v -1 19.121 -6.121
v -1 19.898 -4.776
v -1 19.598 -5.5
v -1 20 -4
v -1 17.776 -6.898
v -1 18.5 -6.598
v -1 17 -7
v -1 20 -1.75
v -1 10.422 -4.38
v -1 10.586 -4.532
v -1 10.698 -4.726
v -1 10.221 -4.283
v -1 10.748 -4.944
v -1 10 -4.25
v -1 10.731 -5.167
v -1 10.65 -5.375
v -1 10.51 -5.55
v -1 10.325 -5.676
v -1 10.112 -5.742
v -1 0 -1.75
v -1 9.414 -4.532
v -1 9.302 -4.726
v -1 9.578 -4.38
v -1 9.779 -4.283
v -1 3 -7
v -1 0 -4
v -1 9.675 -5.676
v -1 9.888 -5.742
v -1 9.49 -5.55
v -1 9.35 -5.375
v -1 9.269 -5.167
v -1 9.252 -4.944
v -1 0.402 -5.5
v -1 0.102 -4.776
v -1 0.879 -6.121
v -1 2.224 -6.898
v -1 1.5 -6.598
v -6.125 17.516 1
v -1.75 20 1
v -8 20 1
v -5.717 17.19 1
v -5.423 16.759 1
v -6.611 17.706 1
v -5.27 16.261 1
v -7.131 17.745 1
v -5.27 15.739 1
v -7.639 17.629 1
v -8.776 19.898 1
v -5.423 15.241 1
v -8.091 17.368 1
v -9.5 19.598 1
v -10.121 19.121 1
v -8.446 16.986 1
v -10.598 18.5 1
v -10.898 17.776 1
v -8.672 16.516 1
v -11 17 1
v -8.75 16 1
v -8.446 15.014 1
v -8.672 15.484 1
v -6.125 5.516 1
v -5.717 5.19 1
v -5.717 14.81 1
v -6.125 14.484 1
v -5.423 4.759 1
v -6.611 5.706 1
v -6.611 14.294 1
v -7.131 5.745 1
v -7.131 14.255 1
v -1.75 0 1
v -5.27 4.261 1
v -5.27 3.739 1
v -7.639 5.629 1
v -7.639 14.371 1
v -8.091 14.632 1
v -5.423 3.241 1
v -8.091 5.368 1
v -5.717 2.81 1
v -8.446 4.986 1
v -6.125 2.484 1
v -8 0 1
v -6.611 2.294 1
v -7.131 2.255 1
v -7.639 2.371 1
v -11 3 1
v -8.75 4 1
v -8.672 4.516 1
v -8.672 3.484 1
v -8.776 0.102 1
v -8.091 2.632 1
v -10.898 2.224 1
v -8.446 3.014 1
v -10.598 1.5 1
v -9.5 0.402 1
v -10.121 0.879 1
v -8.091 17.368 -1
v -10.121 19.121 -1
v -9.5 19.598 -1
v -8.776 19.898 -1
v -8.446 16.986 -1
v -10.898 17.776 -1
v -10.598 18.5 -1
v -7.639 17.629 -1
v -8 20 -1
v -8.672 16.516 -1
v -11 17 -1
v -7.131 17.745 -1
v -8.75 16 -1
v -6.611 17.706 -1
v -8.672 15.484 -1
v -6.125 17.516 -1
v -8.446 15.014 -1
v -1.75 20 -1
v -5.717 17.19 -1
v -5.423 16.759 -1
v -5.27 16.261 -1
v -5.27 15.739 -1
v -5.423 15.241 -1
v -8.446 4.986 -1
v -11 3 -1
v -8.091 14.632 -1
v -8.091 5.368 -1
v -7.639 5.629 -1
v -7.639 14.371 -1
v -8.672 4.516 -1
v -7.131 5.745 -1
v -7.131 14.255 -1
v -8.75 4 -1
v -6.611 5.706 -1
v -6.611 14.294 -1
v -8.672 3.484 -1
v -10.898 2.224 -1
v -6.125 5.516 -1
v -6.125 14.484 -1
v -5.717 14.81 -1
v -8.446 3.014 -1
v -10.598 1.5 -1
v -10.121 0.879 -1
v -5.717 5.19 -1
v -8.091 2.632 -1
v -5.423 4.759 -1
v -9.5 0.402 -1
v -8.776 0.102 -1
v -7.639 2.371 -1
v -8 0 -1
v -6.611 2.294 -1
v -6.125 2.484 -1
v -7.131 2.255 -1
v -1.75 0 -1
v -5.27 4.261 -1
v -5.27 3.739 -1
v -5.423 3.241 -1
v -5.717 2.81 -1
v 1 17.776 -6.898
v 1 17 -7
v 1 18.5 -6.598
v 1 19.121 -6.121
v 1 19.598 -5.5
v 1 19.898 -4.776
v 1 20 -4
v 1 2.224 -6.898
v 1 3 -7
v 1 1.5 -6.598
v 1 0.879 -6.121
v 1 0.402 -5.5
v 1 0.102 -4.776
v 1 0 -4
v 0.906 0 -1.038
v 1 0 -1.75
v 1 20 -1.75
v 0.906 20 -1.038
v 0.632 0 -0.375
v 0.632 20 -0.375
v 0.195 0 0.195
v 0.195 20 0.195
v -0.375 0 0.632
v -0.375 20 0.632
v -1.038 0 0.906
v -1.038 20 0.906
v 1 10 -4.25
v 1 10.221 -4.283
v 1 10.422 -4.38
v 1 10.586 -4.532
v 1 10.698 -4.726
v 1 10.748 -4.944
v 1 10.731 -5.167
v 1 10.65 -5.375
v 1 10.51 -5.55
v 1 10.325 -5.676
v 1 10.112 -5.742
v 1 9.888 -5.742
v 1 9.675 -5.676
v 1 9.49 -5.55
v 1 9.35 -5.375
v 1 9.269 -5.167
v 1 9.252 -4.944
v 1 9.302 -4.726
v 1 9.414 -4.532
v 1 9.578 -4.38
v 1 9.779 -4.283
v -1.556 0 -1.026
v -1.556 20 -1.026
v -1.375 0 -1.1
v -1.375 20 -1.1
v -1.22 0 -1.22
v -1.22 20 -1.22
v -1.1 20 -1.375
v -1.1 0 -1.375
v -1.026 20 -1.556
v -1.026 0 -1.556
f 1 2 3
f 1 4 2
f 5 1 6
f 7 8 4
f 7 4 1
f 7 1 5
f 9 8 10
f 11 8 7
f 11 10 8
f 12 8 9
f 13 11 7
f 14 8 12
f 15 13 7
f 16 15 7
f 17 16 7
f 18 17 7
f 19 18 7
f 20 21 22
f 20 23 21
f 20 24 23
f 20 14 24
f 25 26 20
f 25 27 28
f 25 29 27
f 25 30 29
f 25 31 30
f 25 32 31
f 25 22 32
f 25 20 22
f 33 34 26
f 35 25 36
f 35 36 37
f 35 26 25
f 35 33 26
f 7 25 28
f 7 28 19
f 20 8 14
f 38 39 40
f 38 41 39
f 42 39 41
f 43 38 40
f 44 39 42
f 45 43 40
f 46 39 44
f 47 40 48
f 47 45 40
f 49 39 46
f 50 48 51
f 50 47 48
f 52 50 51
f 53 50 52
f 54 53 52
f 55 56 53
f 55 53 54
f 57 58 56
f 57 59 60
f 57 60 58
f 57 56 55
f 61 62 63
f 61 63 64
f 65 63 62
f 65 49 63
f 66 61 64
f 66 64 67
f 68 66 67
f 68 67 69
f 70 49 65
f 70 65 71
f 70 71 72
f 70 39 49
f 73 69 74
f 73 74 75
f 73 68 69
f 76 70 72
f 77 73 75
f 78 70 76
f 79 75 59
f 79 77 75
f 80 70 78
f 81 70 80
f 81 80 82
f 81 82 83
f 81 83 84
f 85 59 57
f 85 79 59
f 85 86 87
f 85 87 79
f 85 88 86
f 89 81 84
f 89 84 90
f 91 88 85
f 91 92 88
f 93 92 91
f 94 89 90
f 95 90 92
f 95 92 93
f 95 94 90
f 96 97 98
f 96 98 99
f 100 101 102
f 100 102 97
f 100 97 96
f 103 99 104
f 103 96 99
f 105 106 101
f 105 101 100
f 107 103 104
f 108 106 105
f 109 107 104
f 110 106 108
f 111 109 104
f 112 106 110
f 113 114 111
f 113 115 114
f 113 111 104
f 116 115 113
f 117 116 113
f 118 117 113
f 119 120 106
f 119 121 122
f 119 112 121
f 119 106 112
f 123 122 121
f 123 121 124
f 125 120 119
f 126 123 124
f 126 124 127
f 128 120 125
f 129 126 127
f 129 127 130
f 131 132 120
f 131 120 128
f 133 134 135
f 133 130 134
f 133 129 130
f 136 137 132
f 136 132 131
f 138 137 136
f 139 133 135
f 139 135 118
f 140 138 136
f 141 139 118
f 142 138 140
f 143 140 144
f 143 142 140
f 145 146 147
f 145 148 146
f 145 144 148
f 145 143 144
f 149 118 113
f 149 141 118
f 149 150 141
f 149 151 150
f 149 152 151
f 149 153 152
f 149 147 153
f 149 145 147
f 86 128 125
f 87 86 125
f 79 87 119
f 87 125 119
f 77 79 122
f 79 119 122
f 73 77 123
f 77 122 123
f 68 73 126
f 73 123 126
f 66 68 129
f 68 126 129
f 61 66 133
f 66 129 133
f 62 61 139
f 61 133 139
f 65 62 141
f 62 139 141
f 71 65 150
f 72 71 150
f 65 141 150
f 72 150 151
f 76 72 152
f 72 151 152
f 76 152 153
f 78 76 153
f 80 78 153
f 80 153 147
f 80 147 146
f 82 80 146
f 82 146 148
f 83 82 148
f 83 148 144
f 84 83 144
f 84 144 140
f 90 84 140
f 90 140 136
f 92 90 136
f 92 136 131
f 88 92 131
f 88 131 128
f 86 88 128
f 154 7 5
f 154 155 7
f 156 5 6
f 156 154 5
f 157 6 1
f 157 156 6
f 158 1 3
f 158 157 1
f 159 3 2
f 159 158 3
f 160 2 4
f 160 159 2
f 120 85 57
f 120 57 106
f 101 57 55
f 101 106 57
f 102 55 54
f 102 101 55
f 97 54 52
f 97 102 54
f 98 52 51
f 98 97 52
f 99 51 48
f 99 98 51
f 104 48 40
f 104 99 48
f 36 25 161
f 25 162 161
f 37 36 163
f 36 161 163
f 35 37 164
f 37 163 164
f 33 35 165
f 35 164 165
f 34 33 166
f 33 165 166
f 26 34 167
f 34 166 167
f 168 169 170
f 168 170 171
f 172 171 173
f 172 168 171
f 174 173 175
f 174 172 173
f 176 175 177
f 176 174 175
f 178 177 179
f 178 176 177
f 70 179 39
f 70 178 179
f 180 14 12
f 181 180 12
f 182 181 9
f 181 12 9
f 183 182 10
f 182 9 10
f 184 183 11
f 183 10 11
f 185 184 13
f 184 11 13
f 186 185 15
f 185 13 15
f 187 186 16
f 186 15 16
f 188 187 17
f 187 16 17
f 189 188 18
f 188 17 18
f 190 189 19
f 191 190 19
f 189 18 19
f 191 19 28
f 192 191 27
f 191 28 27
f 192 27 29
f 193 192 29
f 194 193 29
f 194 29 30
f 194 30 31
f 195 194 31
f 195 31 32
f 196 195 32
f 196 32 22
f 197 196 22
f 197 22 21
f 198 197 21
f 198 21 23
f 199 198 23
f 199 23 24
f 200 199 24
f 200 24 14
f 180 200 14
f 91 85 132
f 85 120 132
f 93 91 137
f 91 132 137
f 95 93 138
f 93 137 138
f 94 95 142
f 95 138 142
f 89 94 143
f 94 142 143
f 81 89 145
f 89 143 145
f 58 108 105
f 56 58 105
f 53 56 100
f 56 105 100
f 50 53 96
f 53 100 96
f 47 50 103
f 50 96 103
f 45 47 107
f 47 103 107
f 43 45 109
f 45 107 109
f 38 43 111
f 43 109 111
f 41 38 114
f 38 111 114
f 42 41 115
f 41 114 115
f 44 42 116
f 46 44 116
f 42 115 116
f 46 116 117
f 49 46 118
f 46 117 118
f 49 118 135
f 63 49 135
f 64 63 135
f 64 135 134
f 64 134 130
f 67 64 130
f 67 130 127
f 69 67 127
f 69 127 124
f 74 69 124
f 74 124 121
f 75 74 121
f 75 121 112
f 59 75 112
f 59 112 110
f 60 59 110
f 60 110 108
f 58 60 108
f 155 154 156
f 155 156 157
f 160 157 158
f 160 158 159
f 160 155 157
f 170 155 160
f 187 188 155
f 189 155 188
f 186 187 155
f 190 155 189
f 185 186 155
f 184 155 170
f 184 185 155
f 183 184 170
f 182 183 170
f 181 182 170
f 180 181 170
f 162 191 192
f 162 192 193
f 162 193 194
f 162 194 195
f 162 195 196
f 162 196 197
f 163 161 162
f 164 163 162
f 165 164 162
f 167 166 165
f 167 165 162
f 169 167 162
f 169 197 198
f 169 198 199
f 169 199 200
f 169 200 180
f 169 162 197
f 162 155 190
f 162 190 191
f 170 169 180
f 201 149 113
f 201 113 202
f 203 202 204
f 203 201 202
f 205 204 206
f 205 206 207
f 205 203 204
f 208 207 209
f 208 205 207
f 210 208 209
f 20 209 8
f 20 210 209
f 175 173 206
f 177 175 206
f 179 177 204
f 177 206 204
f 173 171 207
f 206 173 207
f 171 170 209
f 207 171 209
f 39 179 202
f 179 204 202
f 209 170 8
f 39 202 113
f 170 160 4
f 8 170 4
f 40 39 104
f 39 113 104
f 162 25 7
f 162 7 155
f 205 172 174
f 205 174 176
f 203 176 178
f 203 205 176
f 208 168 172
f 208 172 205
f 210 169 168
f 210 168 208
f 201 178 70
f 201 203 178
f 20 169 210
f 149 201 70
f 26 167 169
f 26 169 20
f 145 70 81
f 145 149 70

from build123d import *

# Parameters (mm, degrees)
BOSS_EXTRUDE1_DEPTH = 20
FILLET1_R           = 3
SKETCH3_R           = 1.75
CUT_EXTRUDE1_DEPTH  = 24.600847442
SKETCH4_R           = 0.75
CUT_EXTRUDE2_DEPTH  = 24.430749028


with BuildPart() as part:
    # Sketch2 → Boss-Extrude1 (new body)
    with BuildSketch(Plane(origin=(0, 0, 0), x_dir=(1, 0, 0), z_dir=(0, 1, 0))):
        with BuildLine():
            Line((-1, 7), (1, 7))
            Line((1, 7), (1, 1.75))
            ThreePointArc((1, 1.75), (0.194543648, -0.194543648), (-1.75, -1))
            Line((-1.75, -1), (-11, -1))
            Line((-11, -1), (-11, 1))
            Line((-11, 1), (-1.75, 1))
            ThreePointArc((-1.75, 1), (-1.219669914, 1.219669914), (-1, 1.75))
            Line((-1, 1.75), (-1, 7))
        make_face()
    extrude(amount=BOSS_EXTRUDE1_DEPTH)

    # Fillet1
    fillet1_edges = [part.edges().sort_by_distance(p)[0] for p in [
        (-11, 0, 0),
        (-11, 20, 0),
        (0, 20, -7),
        (0, 0, -7),
    ]]
    fillet(fillet1_edges, radius=FILLET1_R)

    # Sketch3 → Cut-Extrude1 (cut, through all)
    with BuildSketch(Plane(origin=(0, 0, -1), x_dir=(-1, 0, 0), z_dir=(0, 0, -1))):
        with Locations((7, 16)):
            Circle(SKETCH3_R)
        with Locations((7, 4)):
            Circle(SKETCH3_R)
    extrude(amount=-CUT_EXTRUDE1_DEPTH, mode=Mode.SUBTRACT)

    # Sketch4 → Cut-Extrude2 (cut, through all)
    with BuildSketch(Plane.ZY.offset(1)):
        with Locations((-5, 10)):
            Circle(SKETCH4_R)
    extrude(amount=-CUT_EXTRUDE2_DEPTH, mode=Mode.SUBTRACT)


solid = part.part
